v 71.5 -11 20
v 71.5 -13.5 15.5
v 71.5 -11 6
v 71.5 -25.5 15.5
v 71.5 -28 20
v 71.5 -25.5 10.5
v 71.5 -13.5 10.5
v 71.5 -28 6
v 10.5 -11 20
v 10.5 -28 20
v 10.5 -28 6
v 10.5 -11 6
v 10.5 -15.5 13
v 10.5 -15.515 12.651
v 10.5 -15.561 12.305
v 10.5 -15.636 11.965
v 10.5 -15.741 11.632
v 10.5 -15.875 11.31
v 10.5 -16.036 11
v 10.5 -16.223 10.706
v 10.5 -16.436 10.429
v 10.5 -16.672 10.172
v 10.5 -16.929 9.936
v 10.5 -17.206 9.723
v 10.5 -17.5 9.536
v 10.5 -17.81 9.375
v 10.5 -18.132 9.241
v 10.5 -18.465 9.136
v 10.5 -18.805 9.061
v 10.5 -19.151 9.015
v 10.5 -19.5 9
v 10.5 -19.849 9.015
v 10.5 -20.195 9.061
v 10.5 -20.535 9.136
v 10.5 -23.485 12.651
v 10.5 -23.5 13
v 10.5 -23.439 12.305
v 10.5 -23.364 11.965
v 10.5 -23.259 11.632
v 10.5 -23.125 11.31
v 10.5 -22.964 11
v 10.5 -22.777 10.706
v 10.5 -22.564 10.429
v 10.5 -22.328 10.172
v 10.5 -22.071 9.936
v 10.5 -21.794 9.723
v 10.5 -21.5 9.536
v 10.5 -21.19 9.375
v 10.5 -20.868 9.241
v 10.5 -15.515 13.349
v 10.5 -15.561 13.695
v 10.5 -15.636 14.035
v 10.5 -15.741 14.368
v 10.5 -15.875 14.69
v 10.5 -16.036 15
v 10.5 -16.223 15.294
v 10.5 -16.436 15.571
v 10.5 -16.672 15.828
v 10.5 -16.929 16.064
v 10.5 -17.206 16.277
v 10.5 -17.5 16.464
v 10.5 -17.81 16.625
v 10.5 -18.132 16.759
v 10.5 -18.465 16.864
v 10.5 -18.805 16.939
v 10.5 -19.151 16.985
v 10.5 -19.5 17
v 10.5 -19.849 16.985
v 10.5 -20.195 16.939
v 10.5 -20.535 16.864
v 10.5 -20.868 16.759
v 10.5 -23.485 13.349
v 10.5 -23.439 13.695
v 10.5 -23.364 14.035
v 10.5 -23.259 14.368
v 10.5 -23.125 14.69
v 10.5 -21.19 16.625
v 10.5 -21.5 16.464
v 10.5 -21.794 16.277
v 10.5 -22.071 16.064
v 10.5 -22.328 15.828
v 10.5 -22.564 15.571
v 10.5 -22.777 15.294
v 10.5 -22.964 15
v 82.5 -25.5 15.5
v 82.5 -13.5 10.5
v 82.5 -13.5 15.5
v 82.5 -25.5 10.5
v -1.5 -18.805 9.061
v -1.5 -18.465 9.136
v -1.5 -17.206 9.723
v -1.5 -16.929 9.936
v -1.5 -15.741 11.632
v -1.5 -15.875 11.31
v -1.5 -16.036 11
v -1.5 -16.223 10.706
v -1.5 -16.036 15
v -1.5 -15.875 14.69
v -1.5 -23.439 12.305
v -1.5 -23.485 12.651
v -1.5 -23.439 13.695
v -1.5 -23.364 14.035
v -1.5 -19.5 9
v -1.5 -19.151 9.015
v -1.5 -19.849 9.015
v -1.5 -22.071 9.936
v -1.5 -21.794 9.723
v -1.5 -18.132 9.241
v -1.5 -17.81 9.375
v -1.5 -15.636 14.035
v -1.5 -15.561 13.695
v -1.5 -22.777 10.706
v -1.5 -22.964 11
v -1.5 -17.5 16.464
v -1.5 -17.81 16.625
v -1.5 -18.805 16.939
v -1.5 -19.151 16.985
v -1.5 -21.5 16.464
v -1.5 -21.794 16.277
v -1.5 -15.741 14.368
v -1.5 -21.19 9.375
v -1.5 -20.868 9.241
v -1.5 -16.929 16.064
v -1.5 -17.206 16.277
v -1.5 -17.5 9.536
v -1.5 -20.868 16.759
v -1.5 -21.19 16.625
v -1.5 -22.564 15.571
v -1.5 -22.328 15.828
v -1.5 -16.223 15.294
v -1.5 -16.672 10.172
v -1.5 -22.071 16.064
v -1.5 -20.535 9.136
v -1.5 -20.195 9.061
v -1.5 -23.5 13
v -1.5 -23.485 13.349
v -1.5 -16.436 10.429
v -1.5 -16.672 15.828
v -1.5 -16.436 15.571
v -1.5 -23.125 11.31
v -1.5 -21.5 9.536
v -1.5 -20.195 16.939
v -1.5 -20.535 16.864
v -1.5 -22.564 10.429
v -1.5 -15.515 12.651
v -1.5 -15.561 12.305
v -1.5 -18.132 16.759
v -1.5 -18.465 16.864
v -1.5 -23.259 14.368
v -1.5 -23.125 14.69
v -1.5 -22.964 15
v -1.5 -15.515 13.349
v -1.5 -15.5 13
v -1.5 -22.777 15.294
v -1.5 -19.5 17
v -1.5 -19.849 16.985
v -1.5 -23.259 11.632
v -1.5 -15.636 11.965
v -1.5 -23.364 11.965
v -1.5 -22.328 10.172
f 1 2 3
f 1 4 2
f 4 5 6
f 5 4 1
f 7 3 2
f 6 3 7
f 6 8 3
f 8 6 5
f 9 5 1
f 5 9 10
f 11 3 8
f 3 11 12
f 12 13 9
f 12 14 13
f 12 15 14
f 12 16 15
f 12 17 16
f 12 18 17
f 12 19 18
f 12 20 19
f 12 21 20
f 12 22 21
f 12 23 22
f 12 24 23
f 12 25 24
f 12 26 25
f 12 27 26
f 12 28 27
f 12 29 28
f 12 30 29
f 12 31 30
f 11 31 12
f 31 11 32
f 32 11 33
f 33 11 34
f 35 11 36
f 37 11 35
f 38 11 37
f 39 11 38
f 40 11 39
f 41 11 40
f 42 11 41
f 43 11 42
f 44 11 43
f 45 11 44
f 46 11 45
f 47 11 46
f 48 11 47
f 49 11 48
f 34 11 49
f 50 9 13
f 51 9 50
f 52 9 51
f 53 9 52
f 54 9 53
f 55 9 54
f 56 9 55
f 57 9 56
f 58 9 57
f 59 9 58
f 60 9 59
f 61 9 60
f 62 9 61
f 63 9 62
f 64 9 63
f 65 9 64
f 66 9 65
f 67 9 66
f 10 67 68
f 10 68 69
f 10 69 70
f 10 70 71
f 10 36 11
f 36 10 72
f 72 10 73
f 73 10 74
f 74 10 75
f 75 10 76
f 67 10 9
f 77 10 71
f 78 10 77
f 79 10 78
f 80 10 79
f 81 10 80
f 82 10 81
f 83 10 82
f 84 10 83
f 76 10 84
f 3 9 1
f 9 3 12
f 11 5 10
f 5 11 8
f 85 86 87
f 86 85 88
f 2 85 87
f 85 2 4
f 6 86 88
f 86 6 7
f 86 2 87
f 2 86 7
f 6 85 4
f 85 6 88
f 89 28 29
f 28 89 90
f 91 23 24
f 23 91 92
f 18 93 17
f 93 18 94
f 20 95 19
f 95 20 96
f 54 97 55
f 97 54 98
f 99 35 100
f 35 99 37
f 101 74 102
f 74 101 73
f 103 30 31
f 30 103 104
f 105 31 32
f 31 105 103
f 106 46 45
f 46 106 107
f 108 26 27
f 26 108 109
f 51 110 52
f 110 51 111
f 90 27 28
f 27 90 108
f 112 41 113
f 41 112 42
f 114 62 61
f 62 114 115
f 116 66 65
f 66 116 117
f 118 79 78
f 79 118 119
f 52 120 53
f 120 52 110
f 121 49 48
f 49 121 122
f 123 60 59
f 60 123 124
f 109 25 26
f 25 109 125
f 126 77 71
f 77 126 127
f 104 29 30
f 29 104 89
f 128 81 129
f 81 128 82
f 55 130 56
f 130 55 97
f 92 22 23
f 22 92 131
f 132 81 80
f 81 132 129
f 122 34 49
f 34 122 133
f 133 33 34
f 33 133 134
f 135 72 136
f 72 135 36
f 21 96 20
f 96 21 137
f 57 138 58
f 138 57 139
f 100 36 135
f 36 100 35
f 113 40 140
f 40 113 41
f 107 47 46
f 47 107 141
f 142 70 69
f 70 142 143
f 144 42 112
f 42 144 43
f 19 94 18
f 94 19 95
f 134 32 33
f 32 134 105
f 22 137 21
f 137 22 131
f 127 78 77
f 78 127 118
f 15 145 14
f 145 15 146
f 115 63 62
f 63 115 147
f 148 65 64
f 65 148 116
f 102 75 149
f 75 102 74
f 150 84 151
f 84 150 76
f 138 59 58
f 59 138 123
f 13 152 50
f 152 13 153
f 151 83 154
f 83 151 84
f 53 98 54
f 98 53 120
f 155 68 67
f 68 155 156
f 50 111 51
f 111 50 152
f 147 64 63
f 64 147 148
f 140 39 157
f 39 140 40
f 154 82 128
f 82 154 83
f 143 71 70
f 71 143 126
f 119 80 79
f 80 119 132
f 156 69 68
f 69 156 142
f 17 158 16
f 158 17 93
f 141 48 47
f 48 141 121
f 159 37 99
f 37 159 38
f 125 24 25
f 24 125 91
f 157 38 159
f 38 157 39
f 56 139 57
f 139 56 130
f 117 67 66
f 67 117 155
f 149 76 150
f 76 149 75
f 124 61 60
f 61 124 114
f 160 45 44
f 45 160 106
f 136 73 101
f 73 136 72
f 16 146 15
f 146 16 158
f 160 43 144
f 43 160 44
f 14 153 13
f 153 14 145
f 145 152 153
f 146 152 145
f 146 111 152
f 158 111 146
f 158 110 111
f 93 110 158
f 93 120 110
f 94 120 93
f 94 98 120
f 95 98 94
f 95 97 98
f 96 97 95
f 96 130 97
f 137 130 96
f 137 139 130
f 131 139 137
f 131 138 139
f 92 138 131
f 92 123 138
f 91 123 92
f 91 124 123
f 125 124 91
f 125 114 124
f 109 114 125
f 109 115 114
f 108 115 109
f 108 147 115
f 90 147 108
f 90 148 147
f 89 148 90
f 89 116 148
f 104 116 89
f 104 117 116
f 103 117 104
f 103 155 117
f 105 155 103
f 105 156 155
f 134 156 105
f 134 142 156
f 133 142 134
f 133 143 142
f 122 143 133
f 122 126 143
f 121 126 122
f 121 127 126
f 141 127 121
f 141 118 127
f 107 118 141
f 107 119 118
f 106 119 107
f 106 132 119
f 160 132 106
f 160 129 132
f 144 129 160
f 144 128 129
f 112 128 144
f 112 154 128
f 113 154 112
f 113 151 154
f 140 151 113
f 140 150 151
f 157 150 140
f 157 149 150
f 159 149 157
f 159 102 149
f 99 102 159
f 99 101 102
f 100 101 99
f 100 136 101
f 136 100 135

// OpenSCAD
// SDR Stick

// Global resolution
$fs = 0.1;  // Don't generate smaller facets than 0.1 mm
$fa = 5;    // Don't generate larger angles than 5 degrees

module sdr() {
  color("Black") {
    translate([10.5, -28.0,  6.0]) cube([61.0, 17.0, 14.0]);
  }
  color("Silver") {
    translate([71.5, -25.5,  10.5]) cube([11.0, 12.0, 5.0]);
  }
  color("Gold") {
    translate([-1.5, -19.5,  13.0]) rotate([0, 90, 0]) cylinder(h=12.0, r=4.0);
  }
}

sdr();
